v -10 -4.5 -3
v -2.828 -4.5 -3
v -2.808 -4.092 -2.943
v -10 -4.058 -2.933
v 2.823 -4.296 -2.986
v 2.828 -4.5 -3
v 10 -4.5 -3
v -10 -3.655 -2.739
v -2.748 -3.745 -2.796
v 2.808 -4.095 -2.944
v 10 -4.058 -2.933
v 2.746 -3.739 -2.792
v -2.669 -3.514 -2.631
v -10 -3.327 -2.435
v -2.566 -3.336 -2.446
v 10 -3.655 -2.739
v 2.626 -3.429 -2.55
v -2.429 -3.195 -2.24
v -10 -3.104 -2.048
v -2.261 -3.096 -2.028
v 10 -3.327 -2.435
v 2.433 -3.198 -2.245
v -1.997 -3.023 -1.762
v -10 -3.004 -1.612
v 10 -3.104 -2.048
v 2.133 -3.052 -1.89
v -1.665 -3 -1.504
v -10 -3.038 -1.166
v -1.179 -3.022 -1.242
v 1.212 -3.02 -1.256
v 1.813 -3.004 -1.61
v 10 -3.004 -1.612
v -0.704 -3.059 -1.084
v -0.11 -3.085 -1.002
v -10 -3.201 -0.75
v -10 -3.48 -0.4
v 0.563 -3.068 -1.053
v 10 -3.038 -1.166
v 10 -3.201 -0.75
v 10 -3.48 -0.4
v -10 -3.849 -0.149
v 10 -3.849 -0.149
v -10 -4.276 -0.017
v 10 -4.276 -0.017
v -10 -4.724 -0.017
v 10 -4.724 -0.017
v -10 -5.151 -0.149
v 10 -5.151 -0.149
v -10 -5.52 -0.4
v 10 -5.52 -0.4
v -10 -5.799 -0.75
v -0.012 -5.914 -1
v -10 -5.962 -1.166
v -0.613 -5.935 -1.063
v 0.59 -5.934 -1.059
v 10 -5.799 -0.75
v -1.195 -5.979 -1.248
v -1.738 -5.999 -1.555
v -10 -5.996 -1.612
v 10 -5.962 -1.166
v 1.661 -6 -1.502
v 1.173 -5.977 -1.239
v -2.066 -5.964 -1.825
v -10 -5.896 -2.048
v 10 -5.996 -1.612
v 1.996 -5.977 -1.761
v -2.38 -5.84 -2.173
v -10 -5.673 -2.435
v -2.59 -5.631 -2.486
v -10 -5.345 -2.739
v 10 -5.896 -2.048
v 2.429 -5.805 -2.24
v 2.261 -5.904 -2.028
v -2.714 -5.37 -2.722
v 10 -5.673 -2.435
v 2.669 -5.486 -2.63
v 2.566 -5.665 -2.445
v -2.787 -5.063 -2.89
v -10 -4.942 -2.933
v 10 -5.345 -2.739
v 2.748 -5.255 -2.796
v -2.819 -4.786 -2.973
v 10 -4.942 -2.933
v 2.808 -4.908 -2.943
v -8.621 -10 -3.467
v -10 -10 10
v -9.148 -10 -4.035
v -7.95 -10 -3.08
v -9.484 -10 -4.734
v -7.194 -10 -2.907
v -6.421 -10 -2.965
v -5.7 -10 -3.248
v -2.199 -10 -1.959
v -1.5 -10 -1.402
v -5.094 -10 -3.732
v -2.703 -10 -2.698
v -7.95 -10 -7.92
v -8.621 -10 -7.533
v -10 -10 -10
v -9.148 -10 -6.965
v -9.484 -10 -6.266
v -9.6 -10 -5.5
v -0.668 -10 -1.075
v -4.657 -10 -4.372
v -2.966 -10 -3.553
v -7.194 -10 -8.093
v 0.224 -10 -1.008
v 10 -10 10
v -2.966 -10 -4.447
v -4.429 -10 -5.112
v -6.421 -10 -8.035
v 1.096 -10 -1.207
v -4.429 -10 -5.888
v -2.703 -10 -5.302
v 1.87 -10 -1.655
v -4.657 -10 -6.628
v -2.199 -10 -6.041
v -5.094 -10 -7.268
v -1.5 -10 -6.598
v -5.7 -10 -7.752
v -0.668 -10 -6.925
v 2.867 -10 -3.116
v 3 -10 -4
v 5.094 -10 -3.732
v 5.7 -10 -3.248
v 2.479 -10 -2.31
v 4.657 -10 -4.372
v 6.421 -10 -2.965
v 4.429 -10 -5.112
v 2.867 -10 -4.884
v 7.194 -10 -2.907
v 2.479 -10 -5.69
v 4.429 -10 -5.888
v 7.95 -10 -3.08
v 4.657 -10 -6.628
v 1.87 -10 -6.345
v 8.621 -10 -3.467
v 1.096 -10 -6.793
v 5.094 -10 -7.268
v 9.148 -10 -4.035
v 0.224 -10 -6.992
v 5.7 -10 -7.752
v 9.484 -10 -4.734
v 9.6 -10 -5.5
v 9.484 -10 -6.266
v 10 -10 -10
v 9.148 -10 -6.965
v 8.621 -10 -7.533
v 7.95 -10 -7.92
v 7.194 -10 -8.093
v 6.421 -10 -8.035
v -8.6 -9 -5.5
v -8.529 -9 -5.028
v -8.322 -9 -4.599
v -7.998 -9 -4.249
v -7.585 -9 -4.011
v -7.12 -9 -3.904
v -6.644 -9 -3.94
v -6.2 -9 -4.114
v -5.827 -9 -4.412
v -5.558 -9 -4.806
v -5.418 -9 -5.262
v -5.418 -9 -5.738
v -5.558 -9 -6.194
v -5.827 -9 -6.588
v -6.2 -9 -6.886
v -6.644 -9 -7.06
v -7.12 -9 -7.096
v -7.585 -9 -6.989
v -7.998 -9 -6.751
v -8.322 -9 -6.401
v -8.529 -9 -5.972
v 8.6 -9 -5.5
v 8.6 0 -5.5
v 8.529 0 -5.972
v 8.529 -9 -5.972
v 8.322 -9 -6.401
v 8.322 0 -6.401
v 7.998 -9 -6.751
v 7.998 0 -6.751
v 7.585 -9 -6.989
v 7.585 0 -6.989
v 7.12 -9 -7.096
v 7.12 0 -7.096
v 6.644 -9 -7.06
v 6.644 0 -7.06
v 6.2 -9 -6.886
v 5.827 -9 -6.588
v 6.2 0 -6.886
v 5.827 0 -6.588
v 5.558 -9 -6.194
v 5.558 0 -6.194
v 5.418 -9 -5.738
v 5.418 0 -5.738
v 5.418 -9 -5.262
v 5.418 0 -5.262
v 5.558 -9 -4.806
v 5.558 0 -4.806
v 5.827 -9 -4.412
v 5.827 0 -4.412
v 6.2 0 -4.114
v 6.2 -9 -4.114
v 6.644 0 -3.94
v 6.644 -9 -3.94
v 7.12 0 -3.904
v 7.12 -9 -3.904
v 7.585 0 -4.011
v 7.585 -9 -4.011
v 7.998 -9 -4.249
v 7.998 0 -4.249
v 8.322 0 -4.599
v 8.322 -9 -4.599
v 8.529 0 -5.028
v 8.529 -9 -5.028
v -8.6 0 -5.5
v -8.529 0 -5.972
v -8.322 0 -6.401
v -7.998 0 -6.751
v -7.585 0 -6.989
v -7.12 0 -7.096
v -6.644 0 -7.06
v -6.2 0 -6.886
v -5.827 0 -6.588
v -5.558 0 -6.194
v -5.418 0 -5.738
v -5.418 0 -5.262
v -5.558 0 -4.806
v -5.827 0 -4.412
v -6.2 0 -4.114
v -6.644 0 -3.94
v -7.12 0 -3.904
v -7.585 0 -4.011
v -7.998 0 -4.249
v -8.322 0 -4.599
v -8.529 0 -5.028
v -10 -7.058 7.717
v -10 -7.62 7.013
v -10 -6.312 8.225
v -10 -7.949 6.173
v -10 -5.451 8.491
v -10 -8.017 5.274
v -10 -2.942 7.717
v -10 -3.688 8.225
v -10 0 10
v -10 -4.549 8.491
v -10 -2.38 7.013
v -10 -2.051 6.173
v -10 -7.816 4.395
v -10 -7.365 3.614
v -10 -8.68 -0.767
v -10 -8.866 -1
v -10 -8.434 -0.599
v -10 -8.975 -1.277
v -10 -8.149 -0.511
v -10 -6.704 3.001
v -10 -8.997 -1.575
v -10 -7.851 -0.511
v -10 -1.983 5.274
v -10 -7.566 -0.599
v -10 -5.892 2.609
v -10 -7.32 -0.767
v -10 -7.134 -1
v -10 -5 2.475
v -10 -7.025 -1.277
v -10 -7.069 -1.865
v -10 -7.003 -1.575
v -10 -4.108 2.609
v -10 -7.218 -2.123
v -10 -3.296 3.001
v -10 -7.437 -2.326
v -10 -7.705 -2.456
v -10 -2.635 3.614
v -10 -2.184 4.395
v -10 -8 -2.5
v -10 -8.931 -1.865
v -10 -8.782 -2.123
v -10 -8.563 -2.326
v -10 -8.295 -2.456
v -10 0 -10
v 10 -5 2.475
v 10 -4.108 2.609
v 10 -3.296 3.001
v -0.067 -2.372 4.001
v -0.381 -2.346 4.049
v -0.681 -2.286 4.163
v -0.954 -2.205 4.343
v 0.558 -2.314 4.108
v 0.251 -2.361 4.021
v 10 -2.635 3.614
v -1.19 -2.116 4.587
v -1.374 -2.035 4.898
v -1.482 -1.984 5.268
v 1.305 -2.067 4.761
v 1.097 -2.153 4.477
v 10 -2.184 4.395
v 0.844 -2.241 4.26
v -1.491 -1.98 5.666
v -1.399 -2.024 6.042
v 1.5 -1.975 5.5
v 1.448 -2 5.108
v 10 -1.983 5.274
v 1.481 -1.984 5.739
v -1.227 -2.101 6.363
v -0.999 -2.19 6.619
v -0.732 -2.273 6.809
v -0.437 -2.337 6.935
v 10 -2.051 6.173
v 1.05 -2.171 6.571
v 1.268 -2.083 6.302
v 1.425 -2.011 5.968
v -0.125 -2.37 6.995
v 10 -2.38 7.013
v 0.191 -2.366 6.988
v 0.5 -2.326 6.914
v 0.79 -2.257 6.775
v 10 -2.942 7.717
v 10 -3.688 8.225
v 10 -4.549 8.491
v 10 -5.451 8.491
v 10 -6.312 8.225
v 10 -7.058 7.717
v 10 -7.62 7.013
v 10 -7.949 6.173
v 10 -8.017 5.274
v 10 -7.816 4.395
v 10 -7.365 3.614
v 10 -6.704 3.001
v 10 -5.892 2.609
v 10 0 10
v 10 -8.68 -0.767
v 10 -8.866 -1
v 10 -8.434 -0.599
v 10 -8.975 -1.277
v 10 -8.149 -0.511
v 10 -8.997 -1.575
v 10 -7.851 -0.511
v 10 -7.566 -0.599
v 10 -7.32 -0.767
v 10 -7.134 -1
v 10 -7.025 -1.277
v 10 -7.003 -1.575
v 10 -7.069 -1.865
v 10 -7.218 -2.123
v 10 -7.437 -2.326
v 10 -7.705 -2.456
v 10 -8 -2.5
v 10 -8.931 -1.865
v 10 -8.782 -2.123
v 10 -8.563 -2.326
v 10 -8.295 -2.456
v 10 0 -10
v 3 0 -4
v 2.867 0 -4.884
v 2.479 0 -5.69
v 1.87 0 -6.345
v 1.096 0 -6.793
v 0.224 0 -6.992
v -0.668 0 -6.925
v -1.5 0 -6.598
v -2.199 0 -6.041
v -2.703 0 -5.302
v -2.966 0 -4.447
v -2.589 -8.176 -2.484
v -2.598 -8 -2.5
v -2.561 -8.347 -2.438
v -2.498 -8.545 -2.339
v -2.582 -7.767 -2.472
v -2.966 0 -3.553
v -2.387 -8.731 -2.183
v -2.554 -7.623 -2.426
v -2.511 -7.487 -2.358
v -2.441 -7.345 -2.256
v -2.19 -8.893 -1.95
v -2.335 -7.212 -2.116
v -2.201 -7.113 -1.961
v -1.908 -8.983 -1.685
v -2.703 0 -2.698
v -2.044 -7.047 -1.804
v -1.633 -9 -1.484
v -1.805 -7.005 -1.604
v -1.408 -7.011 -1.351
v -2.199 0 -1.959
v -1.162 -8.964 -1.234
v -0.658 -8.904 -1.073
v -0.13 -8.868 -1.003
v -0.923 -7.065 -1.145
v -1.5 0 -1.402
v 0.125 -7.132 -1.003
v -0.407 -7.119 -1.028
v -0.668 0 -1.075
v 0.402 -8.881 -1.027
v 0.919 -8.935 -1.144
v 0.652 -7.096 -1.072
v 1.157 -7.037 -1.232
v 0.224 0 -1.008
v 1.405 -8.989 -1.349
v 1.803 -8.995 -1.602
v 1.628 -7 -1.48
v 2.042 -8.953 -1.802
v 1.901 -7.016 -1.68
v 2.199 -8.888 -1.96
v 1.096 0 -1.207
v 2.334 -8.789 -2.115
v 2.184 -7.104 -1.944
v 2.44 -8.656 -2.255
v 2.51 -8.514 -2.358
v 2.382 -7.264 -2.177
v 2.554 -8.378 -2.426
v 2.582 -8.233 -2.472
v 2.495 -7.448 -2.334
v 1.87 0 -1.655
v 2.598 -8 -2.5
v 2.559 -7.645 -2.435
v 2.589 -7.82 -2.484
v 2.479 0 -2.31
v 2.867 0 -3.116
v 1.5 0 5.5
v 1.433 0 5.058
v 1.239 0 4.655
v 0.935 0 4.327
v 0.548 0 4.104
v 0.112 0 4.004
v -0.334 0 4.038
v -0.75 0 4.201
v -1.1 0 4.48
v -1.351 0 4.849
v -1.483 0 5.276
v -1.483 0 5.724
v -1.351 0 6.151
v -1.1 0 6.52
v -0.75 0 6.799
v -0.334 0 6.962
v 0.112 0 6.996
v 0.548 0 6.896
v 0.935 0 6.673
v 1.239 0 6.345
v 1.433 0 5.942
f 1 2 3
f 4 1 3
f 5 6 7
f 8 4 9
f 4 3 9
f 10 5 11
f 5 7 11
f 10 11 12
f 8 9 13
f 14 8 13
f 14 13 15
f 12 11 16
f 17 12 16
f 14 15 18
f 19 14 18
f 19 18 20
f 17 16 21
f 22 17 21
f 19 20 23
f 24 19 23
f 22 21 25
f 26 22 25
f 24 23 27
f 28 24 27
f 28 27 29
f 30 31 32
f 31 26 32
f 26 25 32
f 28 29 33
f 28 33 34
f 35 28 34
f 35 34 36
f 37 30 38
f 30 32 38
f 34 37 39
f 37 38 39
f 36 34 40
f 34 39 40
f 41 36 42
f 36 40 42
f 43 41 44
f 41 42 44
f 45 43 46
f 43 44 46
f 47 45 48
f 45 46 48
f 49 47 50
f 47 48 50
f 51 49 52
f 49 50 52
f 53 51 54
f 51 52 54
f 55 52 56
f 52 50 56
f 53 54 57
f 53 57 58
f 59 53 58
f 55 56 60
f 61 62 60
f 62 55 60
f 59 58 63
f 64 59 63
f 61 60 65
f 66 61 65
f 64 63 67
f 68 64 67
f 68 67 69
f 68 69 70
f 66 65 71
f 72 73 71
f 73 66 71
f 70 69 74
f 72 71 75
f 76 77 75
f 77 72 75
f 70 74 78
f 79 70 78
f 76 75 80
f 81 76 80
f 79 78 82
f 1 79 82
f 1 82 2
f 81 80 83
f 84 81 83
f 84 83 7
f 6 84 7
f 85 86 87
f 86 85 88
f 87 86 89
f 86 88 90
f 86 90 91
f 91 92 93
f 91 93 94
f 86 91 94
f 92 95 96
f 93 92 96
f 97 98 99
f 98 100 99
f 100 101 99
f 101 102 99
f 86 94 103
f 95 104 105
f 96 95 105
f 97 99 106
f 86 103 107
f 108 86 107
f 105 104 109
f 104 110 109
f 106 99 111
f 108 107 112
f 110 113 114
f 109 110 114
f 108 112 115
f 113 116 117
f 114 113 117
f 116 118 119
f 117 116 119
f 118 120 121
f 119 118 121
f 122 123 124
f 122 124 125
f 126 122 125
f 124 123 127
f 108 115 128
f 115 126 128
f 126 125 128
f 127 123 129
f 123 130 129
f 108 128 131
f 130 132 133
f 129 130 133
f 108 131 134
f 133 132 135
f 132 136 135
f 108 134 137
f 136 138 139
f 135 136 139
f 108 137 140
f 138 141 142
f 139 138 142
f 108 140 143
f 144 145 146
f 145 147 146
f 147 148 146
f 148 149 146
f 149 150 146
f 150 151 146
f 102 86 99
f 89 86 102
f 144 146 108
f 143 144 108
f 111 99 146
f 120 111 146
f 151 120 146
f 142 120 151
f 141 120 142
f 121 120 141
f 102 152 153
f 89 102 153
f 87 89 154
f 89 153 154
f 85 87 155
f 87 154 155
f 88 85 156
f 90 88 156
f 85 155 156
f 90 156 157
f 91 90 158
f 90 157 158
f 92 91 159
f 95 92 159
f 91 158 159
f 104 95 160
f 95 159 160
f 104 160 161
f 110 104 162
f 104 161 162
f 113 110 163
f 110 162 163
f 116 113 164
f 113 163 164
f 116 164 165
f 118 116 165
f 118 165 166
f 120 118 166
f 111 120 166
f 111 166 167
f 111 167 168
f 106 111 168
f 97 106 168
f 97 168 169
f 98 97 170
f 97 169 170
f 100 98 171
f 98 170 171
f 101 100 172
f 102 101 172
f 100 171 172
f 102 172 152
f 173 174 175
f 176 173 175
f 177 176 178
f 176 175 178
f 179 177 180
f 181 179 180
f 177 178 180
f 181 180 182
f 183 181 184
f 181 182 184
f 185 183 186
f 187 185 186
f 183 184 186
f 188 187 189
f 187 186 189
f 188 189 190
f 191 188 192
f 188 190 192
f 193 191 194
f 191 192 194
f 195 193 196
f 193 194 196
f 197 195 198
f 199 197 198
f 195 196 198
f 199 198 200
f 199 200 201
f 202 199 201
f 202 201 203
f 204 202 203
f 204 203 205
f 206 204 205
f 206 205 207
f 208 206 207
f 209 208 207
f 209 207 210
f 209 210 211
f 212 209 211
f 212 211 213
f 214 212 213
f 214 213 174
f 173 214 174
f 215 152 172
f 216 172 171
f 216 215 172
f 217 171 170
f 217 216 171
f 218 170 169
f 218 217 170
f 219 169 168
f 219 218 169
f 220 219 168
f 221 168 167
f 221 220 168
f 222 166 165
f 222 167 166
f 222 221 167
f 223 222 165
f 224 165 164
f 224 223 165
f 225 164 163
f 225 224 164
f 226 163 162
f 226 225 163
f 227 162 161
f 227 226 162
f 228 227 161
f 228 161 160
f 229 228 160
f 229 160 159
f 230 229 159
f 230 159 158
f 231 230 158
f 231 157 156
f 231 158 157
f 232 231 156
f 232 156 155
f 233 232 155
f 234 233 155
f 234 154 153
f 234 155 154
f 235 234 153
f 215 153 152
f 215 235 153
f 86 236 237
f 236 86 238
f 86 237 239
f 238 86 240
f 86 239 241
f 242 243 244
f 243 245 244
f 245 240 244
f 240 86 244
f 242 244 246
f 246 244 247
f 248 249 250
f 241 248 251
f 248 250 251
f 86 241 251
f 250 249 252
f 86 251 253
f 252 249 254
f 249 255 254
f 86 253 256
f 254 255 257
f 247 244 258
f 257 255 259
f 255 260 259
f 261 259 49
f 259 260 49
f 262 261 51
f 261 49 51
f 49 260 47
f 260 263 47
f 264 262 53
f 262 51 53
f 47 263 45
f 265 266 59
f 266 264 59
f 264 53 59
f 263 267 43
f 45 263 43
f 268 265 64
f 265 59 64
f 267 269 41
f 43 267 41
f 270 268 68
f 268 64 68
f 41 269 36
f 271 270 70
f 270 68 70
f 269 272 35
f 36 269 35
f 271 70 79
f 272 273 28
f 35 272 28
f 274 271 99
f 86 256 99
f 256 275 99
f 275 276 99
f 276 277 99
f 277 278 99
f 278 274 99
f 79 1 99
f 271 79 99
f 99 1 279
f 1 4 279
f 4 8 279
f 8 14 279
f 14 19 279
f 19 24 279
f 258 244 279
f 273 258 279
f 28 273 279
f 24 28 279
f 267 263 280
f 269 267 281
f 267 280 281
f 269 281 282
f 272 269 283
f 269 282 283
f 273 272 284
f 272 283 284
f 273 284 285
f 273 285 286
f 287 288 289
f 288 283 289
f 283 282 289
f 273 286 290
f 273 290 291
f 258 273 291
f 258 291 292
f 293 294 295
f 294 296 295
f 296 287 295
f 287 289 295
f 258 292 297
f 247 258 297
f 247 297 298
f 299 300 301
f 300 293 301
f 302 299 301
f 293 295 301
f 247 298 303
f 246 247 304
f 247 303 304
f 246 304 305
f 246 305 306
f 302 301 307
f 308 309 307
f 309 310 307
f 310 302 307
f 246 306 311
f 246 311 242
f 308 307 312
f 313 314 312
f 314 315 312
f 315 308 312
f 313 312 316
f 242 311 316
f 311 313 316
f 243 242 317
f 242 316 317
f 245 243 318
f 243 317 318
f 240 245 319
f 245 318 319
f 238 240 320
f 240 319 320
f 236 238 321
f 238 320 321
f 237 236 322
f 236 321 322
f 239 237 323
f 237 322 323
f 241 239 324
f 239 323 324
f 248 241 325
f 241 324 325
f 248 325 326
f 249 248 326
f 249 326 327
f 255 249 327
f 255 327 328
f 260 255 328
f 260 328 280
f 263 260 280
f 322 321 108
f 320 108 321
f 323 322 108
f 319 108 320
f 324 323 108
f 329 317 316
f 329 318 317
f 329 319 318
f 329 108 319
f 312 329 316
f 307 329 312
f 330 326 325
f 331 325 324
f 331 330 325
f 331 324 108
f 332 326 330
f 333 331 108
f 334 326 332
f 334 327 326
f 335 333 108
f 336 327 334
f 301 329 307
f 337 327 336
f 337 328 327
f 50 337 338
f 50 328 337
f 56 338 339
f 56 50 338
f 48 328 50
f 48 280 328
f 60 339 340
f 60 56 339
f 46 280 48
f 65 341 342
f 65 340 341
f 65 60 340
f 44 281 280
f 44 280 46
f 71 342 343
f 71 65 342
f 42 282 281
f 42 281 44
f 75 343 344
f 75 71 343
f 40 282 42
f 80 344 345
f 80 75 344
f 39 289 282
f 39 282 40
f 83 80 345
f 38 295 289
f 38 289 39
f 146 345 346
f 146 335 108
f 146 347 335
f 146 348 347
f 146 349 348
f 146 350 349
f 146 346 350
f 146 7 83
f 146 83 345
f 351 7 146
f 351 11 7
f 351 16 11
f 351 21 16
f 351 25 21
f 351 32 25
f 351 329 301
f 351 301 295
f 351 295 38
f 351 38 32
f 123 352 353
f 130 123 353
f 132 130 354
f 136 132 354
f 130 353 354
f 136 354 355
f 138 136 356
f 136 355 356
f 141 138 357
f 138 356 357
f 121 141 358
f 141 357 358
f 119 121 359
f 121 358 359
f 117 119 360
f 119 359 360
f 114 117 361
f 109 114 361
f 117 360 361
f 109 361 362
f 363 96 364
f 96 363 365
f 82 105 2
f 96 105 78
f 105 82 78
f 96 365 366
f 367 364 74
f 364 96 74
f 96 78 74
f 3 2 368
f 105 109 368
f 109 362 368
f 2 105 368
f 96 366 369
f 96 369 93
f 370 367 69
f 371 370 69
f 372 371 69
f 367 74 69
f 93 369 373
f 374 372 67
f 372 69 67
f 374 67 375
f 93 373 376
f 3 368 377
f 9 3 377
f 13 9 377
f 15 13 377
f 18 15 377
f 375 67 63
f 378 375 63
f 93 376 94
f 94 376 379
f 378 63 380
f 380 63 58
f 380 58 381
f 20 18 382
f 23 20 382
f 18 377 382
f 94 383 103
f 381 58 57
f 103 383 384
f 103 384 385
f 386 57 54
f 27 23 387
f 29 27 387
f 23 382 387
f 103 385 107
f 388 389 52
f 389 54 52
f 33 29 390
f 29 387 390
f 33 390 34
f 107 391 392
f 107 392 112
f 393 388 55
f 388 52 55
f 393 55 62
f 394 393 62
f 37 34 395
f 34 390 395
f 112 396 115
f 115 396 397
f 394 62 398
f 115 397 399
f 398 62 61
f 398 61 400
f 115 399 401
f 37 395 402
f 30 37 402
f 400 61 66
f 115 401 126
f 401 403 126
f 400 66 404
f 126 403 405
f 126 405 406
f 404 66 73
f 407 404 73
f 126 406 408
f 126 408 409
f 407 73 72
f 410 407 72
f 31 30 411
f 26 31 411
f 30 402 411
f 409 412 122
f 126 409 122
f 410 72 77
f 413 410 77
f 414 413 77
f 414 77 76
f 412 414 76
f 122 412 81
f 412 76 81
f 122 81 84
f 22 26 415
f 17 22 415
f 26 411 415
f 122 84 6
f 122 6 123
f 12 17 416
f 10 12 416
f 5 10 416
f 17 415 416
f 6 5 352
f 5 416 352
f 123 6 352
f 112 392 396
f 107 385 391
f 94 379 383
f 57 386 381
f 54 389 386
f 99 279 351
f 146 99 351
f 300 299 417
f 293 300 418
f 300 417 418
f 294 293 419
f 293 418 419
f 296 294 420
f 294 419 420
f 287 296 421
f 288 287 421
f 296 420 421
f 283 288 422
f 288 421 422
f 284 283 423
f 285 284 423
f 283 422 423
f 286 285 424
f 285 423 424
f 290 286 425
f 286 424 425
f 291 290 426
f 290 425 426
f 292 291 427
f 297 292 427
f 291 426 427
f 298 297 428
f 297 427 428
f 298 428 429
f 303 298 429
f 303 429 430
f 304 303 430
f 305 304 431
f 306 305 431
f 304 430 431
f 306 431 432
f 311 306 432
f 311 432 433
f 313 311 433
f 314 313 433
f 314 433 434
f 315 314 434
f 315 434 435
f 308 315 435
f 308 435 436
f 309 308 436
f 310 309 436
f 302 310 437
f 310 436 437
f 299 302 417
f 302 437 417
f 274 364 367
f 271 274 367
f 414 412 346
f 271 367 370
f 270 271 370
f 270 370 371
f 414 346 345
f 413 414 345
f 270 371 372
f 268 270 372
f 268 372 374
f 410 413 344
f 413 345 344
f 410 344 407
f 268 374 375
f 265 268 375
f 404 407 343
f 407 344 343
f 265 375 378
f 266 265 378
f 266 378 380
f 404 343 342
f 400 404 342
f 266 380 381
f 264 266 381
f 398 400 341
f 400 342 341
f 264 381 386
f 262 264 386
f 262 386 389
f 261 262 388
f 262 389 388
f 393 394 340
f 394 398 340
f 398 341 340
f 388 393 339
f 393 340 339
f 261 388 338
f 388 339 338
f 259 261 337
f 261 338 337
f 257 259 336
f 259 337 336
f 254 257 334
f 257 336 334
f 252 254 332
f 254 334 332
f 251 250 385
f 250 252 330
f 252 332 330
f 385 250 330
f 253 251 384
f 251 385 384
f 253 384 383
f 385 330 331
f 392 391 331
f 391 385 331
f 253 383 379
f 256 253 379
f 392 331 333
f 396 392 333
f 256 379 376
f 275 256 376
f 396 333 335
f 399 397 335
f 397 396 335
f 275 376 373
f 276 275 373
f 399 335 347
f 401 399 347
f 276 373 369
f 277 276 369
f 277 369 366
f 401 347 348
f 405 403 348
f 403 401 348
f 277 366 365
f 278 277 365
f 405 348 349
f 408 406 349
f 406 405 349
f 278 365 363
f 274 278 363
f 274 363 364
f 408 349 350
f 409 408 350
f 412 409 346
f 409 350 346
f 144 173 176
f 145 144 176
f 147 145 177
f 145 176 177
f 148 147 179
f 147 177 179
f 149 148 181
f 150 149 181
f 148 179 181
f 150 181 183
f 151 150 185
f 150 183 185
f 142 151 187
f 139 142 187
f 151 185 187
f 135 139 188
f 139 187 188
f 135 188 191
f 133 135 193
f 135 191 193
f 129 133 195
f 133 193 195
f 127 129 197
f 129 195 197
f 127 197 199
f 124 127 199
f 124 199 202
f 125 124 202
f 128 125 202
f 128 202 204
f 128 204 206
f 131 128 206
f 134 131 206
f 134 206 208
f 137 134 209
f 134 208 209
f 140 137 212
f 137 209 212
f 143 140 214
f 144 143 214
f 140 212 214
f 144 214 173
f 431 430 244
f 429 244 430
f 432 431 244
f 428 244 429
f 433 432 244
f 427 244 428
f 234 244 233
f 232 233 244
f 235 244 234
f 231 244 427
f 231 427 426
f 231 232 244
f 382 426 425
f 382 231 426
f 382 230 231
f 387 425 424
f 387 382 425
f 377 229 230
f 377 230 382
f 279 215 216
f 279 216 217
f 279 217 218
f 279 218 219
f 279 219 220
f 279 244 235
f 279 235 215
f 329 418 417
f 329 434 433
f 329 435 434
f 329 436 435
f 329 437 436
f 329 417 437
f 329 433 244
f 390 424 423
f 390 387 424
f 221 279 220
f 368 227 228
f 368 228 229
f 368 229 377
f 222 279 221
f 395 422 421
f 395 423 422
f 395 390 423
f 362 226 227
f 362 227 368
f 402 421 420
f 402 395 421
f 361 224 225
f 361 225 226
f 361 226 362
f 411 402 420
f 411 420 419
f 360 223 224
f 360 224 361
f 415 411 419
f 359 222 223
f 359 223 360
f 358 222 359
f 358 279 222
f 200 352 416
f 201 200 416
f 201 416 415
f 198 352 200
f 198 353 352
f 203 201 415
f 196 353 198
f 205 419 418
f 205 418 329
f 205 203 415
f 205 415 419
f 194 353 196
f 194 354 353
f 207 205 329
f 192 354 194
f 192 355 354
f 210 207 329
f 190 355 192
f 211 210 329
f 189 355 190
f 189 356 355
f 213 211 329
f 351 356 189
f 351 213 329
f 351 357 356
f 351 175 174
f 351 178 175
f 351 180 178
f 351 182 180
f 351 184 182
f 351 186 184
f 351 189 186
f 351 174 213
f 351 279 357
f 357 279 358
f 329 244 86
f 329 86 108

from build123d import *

# Parameters (mm, degrees)
SKETCH1_W           = 20
SKETCH1_H           = 20
BOSS_EXTRUDE1_DEPTH = 10
SKETCH2_R           = 3
CUT_EXTRUDE1_DEPTH  = 11
SKETCH3_R           = 1.6
CUT_EXTRUDE2_DEPTH  = 11
CHAMFER1_SIZE       = 1
CHAMFER2_SIZE       = 1
SKETCH5_R           = 3.025
SKETCH5_R_2         = 1
SKETCH5_R_3         = 1.5
CUT_EXTRUDE3_DEPTH  = 21
SKETCH2_3_R         = 1.5
CUT_EXTRUDE4_DEPTH  = 4


with BuildPart() as part:
    # Sketch1 → Boss-Extrude1 (new body)
    with BuildSketch(Plane(origin=(0, 0, 0), x_dir=(1, 0, 0), z_dir=(0, 1, 0))):
        Rectangle(SKETCH1_W, SKETCH1_H)
    extrude(amount=-BOSS_EXTRUDE1_DEPTH)

    # Sketch2 → Cut-Extrude1 (cut, through all)
    with BuildSketch(Plane(origin=(0, 0, 0), x_dir=(1, 0, 0), z_dir=(0, 1, 0))):
        with Locations((0, 4)):
            Circle(SKETCH2_R)
    extrude(amount=-CUT_EXTRUDE1_DEPTH, mode=Mode.SUBTRACT)

    # Sketch3 → Cut-Extrude2 (cut, through all)
    with BuildSketch(Plane(origin=(0, 0, 0), x_dir=(1, 0, 0), z_dir=(0, 1, 0))):
        with Locations((7, 5.5)):
            Circle(SKETCH3_R)
    cut_extrude2 = extrude(amount=-CUT_EXTRUDE2_DEPTH, mode=Mode.SUBTRACT)

    # Mirror1: Cut-Extrude2 across plane
    add(cut_extrude2.mirror(Plane(origin=(0, 0, 0), x_dir=(0, 0, 1), z_dir=(1, 0, 0))), mode=Mode.SUBTRACT)

    # Chamfer1
    chamfer1_edges = [part.edges().sort_by_distance(p)[0] for p in [
        (5.4, -10, -5.5),
    ]]
    chamfer(chamfer1_edges, length=CHAMFER1_SIZE)

    # Chamfer2
    chamfer2_edges = [part.edges().sort_by_distance(p)[0] for p in [
        (-5.4, -10, -5.5),
    ]]
    chamfer(chamfer2_edges, length=CHAMFER2_SIZE)

    # Sketch5 → Cut-Extrude3 (cut, through all)
    with BuildSketch(Plane(origin=(10, 0, 0), x_dir=(0, 0, -1), z_dir=(1, 0, 0))):
        with Locations((-5.5, -5)):
            Circle(SKETCH5_R)
        with Locations((1.5, -8)):
            Circle(SKETCH5_R_2)
        with Locations((1.5, -4.5)):
            Circle(SKETCH5_R_3)
    extrude(amount=-CUT_EXTRUDE3_DEPTH, mode=Mode.SUBTRACT)

    # Sketch2<3> → Cut-Extrude4 (cut)
    with BuildSketch(Plane(origin=(0, 0, 0), x_dir=(1, 0, 0), z_dir=(0, 1, 0))):
        with Locations((0, -5.5)):
            Circle(SKETCH2_3_R)
    extrude(amount=-CUT_EXTRUDE4_DEPTH, mode=Mode.SUBTRACT)


solid = part.part
